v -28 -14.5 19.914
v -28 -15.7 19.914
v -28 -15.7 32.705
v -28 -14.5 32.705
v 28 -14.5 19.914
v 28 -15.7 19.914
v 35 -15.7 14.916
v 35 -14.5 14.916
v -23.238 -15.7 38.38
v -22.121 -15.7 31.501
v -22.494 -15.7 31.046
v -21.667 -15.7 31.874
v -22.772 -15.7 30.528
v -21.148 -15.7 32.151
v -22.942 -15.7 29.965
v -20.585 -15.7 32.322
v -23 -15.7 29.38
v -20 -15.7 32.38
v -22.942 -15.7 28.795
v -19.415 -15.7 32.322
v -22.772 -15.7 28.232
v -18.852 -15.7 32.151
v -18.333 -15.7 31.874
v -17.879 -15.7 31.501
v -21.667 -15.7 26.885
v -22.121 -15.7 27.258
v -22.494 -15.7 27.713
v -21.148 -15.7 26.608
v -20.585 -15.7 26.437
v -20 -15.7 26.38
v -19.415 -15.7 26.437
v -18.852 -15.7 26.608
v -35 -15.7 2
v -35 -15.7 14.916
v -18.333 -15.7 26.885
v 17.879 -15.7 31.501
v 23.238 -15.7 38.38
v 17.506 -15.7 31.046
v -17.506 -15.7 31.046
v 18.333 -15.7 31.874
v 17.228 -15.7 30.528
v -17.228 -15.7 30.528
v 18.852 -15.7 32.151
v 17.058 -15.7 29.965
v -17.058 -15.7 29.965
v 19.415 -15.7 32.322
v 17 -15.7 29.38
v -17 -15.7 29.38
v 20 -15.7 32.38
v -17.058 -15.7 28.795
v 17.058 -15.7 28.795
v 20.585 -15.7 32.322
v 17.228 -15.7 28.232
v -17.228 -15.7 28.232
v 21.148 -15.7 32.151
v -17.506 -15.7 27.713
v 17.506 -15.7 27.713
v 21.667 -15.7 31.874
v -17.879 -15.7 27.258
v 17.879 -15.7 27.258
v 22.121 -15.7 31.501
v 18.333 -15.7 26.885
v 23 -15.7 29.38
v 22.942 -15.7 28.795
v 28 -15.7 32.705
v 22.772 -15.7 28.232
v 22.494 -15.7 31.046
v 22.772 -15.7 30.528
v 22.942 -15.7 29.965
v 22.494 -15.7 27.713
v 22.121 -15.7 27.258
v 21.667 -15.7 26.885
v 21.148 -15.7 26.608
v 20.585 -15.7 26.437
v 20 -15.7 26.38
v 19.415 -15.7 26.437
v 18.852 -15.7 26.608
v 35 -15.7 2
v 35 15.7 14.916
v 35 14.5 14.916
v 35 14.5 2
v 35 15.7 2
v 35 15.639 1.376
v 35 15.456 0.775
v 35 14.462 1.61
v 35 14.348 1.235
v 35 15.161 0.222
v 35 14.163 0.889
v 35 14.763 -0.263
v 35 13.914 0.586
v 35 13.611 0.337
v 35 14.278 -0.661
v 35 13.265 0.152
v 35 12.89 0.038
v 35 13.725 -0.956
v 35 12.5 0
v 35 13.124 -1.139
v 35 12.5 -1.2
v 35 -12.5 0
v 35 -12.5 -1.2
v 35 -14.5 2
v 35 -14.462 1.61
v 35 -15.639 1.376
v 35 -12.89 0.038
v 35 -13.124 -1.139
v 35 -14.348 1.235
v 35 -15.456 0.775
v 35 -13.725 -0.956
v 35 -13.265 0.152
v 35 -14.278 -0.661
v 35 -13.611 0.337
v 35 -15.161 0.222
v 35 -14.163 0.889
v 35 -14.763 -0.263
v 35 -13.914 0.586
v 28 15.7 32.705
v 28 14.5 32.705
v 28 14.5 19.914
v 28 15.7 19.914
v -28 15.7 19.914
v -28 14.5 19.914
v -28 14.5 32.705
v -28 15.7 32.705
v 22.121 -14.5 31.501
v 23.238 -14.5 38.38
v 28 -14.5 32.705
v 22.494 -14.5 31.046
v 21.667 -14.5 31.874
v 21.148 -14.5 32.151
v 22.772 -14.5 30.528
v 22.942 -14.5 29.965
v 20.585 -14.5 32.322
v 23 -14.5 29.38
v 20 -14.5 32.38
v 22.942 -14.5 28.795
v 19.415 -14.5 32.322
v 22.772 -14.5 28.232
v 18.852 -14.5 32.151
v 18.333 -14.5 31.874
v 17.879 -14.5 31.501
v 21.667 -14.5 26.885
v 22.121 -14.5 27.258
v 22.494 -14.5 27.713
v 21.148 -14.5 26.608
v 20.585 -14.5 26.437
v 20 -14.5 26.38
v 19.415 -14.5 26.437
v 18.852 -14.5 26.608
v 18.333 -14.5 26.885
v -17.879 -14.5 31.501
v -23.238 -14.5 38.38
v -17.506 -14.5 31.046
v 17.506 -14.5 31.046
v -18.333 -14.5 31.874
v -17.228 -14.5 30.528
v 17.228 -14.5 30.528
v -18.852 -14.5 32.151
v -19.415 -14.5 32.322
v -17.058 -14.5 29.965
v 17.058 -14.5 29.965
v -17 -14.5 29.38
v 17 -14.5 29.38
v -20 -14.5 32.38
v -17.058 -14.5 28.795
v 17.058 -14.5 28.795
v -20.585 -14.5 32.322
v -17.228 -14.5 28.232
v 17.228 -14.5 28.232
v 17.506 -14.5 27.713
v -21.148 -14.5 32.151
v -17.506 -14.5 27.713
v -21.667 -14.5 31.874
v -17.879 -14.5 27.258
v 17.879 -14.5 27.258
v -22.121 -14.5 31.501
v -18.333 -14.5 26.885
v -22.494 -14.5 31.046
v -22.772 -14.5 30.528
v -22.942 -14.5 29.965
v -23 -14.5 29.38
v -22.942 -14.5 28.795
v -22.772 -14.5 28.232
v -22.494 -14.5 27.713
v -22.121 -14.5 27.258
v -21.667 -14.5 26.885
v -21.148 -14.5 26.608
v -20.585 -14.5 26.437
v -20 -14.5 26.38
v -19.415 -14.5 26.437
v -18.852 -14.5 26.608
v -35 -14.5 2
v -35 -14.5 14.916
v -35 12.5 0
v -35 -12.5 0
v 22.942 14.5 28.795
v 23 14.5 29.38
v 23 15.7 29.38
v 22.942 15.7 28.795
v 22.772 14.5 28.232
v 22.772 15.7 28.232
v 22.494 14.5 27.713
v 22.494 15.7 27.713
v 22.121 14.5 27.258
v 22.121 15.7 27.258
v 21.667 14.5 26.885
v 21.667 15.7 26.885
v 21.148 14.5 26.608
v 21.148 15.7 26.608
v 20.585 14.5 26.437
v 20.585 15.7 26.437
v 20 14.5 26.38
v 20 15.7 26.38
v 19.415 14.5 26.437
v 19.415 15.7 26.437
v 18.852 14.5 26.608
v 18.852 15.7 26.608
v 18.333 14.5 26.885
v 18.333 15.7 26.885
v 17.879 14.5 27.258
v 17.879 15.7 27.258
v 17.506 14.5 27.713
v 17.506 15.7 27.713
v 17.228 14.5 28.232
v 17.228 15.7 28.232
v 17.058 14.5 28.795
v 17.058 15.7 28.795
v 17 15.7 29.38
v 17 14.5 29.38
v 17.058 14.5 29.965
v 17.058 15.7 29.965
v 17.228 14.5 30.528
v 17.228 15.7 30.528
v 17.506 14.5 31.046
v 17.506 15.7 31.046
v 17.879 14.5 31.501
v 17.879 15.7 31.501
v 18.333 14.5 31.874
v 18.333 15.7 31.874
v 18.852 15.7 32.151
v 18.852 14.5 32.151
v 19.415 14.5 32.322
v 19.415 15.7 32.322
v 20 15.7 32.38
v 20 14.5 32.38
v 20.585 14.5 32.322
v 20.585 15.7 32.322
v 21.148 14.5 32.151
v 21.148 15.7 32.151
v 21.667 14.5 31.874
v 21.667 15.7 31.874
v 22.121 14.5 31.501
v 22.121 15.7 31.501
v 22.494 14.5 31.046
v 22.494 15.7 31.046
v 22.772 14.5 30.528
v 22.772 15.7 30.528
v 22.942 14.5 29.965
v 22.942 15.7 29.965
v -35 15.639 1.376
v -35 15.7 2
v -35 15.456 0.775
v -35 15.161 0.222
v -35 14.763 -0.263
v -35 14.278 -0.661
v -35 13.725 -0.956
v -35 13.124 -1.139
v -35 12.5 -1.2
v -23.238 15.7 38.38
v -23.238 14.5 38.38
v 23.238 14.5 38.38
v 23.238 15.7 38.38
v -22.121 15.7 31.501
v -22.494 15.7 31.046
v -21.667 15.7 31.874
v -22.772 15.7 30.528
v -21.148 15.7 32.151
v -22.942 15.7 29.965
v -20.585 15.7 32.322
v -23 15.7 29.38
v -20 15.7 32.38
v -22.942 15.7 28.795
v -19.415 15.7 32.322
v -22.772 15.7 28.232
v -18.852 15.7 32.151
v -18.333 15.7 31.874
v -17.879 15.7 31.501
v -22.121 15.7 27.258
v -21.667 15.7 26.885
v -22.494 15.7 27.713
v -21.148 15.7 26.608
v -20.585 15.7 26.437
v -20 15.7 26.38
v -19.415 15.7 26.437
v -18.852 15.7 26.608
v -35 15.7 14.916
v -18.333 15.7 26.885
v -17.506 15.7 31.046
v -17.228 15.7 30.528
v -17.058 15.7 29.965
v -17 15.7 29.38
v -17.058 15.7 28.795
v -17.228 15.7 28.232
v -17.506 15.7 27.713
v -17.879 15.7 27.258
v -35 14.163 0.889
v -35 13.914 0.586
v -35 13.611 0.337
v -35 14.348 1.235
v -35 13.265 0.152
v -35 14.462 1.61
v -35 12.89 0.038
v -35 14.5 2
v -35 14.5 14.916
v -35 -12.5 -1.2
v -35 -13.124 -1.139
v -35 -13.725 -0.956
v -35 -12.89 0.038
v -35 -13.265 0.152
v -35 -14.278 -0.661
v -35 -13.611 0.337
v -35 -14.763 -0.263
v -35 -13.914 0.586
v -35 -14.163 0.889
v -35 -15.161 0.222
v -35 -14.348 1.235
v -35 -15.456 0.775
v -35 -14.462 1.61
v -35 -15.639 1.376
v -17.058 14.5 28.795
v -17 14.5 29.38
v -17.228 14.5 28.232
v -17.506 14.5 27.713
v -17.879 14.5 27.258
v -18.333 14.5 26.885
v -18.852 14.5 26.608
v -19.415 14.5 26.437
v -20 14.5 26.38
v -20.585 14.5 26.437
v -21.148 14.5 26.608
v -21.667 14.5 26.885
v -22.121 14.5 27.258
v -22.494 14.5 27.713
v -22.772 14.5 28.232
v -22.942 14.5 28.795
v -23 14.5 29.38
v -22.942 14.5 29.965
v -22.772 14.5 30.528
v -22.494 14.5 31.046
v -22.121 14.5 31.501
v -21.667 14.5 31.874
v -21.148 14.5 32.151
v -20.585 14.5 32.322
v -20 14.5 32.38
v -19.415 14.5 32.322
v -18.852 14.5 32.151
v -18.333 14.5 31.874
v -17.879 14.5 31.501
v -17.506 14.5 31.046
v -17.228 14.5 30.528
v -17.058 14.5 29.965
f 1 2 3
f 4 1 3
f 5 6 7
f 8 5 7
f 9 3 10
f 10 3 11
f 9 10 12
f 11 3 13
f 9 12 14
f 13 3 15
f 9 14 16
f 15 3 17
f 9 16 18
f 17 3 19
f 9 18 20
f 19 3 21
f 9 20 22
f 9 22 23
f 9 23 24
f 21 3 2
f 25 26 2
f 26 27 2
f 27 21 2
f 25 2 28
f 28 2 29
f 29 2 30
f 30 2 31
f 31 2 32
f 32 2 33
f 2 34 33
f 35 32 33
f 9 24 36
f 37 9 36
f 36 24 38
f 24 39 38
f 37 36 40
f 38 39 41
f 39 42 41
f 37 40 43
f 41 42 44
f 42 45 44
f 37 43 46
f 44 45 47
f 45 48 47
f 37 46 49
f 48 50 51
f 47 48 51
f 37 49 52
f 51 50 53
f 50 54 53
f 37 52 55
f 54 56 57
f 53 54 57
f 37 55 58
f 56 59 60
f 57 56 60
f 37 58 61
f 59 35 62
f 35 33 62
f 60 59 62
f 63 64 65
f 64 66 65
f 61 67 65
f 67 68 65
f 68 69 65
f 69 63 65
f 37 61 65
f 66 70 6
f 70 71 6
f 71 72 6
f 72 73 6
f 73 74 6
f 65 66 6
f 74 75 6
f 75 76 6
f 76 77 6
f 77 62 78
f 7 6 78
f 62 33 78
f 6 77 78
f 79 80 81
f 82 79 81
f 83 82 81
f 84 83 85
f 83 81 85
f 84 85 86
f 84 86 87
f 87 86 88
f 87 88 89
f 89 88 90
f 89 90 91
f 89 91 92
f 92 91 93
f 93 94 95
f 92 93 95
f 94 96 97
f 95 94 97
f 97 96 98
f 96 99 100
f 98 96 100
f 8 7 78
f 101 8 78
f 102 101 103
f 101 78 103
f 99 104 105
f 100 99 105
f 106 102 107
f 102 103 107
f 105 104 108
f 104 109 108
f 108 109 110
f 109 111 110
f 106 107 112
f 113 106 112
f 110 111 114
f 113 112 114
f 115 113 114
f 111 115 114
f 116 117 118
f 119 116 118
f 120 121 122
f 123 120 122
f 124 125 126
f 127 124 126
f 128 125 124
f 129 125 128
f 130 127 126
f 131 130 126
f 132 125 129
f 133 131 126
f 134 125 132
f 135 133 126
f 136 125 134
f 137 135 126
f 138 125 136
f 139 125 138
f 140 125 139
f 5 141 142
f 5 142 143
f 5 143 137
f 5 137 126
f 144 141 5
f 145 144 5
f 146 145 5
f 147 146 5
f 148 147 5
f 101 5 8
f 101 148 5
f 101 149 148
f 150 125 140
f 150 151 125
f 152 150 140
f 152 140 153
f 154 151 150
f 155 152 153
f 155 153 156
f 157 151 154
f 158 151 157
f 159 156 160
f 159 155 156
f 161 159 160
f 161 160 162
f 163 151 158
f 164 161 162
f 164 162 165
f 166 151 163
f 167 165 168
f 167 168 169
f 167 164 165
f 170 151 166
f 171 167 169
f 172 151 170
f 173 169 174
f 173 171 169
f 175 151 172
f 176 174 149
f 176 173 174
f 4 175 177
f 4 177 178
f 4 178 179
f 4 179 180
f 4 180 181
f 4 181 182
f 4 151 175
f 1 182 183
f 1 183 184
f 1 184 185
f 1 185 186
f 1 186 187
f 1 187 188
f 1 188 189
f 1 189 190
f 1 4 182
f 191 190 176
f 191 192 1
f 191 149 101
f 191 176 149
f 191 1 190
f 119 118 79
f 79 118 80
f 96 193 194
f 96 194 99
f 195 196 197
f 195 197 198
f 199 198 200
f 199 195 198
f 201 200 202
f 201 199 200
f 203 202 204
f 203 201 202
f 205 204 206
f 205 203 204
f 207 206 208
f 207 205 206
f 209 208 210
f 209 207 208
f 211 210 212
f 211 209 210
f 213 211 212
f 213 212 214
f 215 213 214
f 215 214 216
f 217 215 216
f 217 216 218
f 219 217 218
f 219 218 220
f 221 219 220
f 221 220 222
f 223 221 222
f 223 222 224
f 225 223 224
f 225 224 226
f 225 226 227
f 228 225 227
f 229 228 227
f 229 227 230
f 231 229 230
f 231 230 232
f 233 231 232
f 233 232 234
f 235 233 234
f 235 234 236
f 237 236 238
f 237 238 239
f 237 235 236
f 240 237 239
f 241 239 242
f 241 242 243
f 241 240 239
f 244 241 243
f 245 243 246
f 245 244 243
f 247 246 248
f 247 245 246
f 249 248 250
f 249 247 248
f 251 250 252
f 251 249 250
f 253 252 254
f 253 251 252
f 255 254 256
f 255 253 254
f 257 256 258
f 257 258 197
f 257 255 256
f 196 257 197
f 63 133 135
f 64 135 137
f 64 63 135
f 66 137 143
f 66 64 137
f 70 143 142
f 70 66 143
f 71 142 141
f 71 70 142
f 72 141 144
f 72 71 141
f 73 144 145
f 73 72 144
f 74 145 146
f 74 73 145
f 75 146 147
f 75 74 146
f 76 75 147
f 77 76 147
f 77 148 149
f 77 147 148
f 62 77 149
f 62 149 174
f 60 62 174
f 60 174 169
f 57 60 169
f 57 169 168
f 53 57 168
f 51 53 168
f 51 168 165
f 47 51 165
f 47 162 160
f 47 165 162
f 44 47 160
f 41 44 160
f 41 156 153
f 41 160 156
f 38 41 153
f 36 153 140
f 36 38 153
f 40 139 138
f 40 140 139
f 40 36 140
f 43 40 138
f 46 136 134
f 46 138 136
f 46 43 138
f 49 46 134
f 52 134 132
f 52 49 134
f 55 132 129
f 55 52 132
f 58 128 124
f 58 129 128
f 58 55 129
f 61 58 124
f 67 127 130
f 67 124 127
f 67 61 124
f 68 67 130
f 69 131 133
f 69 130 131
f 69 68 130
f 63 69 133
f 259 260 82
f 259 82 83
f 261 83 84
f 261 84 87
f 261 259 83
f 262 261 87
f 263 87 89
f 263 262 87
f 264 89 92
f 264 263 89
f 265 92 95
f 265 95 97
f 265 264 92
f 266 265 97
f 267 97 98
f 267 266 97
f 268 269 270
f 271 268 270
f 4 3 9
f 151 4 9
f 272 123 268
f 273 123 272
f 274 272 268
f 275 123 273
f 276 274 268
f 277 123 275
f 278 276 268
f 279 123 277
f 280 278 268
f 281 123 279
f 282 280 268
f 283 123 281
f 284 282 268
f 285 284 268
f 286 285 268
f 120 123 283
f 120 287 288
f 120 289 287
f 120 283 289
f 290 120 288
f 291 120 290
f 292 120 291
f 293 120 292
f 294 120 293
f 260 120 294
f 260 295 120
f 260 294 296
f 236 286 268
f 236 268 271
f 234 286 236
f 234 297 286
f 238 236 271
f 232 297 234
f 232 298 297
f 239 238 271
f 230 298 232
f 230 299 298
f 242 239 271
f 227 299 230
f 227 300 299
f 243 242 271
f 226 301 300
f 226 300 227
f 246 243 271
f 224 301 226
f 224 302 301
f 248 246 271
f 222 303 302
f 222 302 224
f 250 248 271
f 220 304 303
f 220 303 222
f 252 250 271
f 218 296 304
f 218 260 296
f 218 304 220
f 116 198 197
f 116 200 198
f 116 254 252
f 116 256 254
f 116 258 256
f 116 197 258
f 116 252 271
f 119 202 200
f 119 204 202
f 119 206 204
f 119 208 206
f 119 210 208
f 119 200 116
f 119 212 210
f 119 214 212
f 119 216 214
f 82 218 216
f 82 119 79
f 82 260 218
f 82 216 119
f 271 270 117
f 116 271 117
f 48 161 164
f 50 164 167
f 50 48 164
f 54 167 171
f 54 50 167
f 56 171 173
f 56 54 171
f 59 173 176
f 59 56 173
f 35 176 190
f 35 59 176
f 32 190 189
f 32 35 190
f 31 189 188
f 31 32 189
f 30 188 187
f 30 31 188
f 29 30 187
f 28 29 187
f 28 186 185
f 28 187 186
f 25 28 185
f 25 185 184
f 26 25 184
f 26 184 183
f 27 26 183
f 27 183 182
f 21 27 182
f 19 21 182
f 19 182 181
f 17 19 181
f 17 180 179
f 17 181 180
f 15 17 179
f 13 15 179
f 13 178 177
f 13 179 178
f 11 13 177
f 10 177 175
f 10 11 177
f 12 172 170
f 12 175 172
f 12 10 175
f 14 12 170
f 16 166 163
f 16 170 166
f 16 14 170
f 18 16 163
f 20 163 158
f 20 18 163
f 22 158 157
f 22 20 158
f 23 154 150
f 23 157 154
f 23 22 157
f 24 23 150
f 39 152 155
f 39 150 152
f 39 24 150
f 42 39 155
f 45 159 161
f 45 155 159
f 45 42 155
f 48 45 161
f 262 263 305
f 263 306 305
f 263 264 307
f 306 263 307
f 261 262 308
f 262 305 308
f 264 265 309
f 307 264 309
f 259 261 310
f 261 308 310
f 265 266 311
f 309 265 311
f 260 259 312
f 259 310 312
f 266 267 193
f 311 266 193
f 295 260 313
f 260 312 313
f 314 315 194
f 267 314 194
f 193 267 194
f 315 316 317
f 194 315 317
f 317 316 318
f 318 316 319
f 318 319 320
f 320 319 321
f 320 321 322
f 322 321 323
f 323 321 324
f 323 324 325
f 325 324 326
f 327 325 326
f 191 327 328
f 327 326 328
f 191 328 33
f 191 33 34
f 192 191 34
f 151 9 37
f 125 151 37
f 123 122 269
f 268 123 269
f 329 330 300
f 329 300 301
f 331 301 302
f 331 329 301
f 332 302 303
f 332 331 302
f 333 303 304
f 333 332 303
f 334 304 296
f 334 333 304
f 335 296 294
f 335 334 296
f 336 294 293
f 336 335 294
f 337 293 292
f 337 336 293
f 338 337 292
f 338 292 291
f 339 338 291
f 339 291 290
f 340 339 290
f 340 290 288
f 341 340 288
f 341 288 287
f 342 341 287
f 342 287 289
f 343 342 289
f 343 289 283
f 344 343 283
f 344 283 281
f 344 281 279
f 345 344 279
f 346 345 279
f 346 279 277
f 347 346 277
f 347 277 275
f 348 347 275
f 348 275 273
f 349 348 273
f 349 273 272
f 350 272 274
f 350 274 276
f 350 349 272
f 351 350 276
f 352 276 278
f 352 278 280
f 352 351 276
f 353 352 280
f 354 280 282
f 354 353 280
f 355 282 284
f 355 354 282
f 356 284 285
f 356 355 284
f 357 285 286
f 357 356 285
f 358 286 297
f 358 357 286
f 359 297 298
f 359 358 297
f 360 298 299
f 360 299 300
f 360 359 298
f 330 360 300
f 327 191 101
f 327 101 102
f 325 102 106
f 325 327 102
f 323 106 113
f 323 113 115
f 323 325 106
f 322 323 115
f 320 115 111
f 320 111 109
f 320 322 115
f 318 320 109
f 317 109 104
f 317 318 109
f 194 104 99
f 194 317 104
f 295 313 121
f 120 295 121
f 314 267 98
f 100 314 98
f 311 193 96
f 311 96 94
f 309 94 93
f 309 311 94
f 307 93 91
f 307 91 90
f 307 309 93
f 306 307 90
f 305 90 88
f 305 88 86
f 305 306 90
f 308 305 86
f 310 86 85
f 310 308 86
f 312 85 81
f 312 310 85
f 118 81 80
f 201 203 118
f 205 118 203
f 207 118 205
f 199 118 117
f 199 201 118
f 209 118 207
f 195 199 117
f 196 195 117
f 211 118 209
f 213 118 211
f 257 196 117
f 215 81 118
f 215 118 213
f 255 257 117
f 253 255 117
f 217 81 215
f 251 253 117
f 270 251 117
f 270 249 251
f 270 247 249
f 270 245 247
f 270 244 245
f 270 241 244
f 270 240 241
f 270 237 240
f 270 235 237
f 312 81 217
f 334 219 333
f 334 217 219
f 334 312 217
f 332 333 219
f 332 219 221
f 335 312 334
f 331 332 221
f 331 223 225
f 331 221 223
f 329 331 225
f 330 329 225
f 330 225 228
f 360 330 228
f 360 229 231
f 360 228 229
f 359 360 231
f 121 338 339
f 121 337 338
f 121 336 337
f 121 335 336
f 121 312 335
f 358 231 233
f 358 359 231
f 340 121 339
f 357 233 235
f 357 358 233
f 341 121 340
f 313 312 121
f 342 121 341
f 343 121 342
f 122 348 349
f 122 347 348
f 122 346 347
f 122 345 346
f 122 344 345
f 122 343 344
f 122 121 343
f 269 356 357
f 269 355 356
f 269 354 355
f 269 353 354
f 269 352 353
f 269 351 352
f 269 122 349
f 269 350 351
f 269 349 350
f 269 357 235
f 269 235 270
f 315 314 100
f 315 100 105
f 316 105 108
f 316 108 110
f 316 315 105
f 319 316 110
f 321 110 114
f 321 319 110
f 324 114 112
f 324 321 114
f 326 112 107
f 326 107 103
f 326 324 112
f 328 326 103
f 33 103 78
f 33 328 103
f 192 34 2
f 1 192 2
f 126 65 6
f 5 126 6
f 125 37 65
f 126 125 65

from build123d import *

# Parameters (mm, degrees)
SM_BASE_FLANGE_1_DEPTH = 1.2
SKETCH_5_R             = 3
CUT_EXTRUDE_1_DEPTH    = 64.494960298
OTHER_START            = 15.362016
OTHER_1_OUTLINE_W      = 70
OTHER_1_OUTLINE_H      = 1.2
OTHER_1_DEPTH          = 37.601839442
OTHER_START_2          = -52.963855442
OTHER_1_2_OUTLINE_W    = 70
OTHER_1_2_OUTLINE_H    = 1.2
OTHER_1_2_DEPTH        = 37.565871442
OTHER_START_3          = -15.7
OTHER_1_3_OUTLINE_R    = 3
OTHER_1_3_DEPTH        = 3.2
OTHER_START_4          = 12.5
OTHER_1_4_OUTLINE_R    = 3
OTHER_1_4_DEPTH        = 3.2
OTHER_START_5          = -35
OTHER_1_5_DEPTH        = 70


with BuildPart() as part:
    # 基体-法兰1: sheet metal written as solids
    # Sketch 1 → 基体-法兰1 (new body)
    with BuildSketch(Plane.XY):
        Polygon((35, 29.5), (28, 34.498419782), (28, 47.289071522), (23.238290906, 52.963855442), (-23.238290906, 52.963855442), (-28, 47.289071522), (-28, 34.498419782), (-35, 29.5), (-35, -29.5), (-28, -34.498419782), (-28, -47.289071522), (-23.238290906, -52.963855442), (23.238290906, -52.963855442), (28, -47.289071522), (28, -34.498419782), (35, -29.5), align=None)
    extrude(amount=-SM_BASE_FLANGE_1_DEPTH)

    # 草图5 → 切除-拉伸1 (cut, through all)
    with BuildSketch(Plane.XY):
        with Locations((-20, 43.963855442)):
            Circle(SKETCH_5_R)
        with Locations(Location((20, 43.963855442, 0), (0, 0, 180))):
            Circle(SKETCH_5_R)
        with Locations((20, -43.963855442)):
            Circle(SKETCH_5_R)
        with Locations(Location((-20, -43.963855442, 0), (0, 0, 180))):
            Circle(SKETCH_5_R)
    extrude(amount=-CUT_EXTRUDE_1_DEPTH, mode=Mode.SUBTRACT)

    # Other 1: read off the stored shape, not the designer's step
    # Other 1 outline → Other 1 (cut)
    with BuildSketch(Plane(origin=(0, 0, 0), x_dir=(1, 0, 0), z_dir=(0, 1, 0)).offset(OTHER_START)):
        with Locations((0, 0.6)):
            Rectangle(OTHER_1_OUTLINE_W, OTHER_1_OUTLINE_H)
    extrude(amount=OTHER_1_DEPTH, mode=Mode.SUBTRACT)

    # Other 1 2 outline → Other 1 2 (cut)
    with BuildSketch(Plane(origin=(0, 0, 0), x_dir=(1, 0, 0), z_dir=(0, 1, 0)).offset(OTHER_START_2)):
        with Locations((0, 0.6)):
            Rectangle(OTHER_1_2_OUTLINE_W, OTHER_1_2_OUTLINE_H)
    extrude(amount=OTHER_1_2_DEPTH, mode=Mode.SUBTRACT)

    # Other 1 3 outline → Other 1 3 (add)
    with BuildSketch(Plane(origin=(0, 0, 0), x_dir=(1, 0, 0), z_dir=(0, 1, 0)).offset(OTHER_START_3)):
        Polygon((35, 0), (-35, 0), (-35, -14.91592955), (-28, -19.914349333), (-28, -32.705001072), (-23.238290906, -38.379784993), (23.238290906, -38.379784993), (28, -32.705001072), (28, -19.914349333), (35, -14.91592955), align=None)
        with Locations((-20, -29.379784993)):
            Circle(OTHER_1_3_OUTLINE_R, mode=Mode.SUBTRACT)
        with Locations((20, -29.379784993)):
            Circle(OTHER_1_3_OUTLINE_R, mode=Mode.SUBTRACT)
    extrude(amount=OTHER_1_3_DEPTH)

    # Other 1 4 outline → Other 1 4 (add)
    with BuildSketch(Plane(origin=(0, 0, 0), x_dir=(1, 0, 0), z_dir=(0, 1, 0)).offset(OTHER_START_4)):
        Polygon((35, 0), (-35, 0), (-35, -14.91592955), (-28, -19.914349333), (-28, -32.705001072), (-23.238290906, -38.379784993), (23.238290906, -38.379784993), (28, -32.705001072), (28, -19.914349333), (35, -14.91592955), align=None)
        with Locations((-20, -29.379784993)):
            Circle(OTHER_1_4_OUTLINE_R, mode=Mode.SUBTRACT)
        with Locations((20, -29.379784993)):
            Circle(OTHER_1_4_OUTLINE_R, mode=Mode.SUBTRACT)
    extrude(amount=OTHER_1_4_DEPTH)

    # Other 1 5 outline → Other 1 5 (cut)
    with BuildSketch(Plane.YZ.offset(OTHER_START_5)):
        with BuildLine():
            Line((14.5, 2), (14.5, 38.379784993))
            Line((14.5, 38.379784993), (12.5, 38.379784993))
            Line((12.5, 38.379784993), (12.5, 0))
            ThreePointArc((12.5, 0), (13.914213562, 0.585786438), (14.5, 2))
        make_face()
        with BuildLine():
            Line((-12.5, 38.379784993), (-14.5, 38.379784993))
            Line((-14.5, 38.379784993), (-14.5, 2))
            ThreePointArc((-14.5, 2), (-13.914213562, 0.585786438), (-12.5, 0))
            Line((-12.5, 0), (-12.5, 38.379784993))
        make_face()
        with BuildLine():
            Line((-15.397984, -1.2), (-12.5, -1.2))
            ThreePointArc((-12.5, -1.2), (-14.7627417, -0.2627417), (-15.7, 2))
            Line((-15.7, 2), (-15.7, 0))
            Line((-15.7, 0), (-15.397984, 0))
            Line((-15.397984, 0), (-15.397984, -1.2))
        make_face()
        with BuildLine():
            ThreePointArc((15.7, 2), (14.7627417, -0.2627417), (12.5, -1.2))
            Line((12.5, -1.2), (15.362016, -1.2))
            Line((15.362016, -1.2), (15.362016, 0))
            Line((15.362016, 0), (15.7, 0))
            Line((15.7, 0), (15.7, 2))
        make_face()
    extrude(amount=OTHER_1_5_DEPTH, mode=Mode.SUBTRACT)


solid = part.part
